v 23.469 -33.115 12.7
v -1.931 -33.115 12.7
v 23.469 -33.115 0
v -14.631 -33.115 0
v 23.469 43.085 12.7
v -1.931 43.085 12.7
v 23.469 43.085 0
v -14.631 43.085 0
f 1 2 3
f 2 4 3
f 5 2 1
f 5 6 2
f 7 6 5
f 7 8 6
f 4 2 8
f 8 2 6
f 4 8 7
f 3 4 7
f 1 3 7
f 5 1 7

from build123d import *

# Parameters (mm, degrees)
F0_W     = 38.1
F0_H     = 76.2
F1_DEPTH = 12.7
F2_SIZE2 = 12.69999
F2_SIZE  = 12.69999


# Not quite as in the source:
# - a fillet or chamfer is up to 0.001 mm smaller than in the source, because OpenCascade refuses the exact size


with BuildPart() as f1:
    # F0 (on Top) → F1 (new body)
    with BuildSketch(Plane.XY):
        with Locations((4.4191572815, 4.9848316369)):
            Rectangle(F0_W, F0_H)
    extrude(amount=F1_DEPTH)

    # F2 (size 12.7 and 12.7 in the source; OpenCascade refuses exactly that, so slightly less here)
    f2_edges = [f1.edges().sort_by_distance(p)[0] for p in [
        (-14.630843, 4.984832, 12.7),
    ]]
    chamfer(f2_edges, length=F2_SIZE, length2=F2_SIZE2)


solid = f1.part
